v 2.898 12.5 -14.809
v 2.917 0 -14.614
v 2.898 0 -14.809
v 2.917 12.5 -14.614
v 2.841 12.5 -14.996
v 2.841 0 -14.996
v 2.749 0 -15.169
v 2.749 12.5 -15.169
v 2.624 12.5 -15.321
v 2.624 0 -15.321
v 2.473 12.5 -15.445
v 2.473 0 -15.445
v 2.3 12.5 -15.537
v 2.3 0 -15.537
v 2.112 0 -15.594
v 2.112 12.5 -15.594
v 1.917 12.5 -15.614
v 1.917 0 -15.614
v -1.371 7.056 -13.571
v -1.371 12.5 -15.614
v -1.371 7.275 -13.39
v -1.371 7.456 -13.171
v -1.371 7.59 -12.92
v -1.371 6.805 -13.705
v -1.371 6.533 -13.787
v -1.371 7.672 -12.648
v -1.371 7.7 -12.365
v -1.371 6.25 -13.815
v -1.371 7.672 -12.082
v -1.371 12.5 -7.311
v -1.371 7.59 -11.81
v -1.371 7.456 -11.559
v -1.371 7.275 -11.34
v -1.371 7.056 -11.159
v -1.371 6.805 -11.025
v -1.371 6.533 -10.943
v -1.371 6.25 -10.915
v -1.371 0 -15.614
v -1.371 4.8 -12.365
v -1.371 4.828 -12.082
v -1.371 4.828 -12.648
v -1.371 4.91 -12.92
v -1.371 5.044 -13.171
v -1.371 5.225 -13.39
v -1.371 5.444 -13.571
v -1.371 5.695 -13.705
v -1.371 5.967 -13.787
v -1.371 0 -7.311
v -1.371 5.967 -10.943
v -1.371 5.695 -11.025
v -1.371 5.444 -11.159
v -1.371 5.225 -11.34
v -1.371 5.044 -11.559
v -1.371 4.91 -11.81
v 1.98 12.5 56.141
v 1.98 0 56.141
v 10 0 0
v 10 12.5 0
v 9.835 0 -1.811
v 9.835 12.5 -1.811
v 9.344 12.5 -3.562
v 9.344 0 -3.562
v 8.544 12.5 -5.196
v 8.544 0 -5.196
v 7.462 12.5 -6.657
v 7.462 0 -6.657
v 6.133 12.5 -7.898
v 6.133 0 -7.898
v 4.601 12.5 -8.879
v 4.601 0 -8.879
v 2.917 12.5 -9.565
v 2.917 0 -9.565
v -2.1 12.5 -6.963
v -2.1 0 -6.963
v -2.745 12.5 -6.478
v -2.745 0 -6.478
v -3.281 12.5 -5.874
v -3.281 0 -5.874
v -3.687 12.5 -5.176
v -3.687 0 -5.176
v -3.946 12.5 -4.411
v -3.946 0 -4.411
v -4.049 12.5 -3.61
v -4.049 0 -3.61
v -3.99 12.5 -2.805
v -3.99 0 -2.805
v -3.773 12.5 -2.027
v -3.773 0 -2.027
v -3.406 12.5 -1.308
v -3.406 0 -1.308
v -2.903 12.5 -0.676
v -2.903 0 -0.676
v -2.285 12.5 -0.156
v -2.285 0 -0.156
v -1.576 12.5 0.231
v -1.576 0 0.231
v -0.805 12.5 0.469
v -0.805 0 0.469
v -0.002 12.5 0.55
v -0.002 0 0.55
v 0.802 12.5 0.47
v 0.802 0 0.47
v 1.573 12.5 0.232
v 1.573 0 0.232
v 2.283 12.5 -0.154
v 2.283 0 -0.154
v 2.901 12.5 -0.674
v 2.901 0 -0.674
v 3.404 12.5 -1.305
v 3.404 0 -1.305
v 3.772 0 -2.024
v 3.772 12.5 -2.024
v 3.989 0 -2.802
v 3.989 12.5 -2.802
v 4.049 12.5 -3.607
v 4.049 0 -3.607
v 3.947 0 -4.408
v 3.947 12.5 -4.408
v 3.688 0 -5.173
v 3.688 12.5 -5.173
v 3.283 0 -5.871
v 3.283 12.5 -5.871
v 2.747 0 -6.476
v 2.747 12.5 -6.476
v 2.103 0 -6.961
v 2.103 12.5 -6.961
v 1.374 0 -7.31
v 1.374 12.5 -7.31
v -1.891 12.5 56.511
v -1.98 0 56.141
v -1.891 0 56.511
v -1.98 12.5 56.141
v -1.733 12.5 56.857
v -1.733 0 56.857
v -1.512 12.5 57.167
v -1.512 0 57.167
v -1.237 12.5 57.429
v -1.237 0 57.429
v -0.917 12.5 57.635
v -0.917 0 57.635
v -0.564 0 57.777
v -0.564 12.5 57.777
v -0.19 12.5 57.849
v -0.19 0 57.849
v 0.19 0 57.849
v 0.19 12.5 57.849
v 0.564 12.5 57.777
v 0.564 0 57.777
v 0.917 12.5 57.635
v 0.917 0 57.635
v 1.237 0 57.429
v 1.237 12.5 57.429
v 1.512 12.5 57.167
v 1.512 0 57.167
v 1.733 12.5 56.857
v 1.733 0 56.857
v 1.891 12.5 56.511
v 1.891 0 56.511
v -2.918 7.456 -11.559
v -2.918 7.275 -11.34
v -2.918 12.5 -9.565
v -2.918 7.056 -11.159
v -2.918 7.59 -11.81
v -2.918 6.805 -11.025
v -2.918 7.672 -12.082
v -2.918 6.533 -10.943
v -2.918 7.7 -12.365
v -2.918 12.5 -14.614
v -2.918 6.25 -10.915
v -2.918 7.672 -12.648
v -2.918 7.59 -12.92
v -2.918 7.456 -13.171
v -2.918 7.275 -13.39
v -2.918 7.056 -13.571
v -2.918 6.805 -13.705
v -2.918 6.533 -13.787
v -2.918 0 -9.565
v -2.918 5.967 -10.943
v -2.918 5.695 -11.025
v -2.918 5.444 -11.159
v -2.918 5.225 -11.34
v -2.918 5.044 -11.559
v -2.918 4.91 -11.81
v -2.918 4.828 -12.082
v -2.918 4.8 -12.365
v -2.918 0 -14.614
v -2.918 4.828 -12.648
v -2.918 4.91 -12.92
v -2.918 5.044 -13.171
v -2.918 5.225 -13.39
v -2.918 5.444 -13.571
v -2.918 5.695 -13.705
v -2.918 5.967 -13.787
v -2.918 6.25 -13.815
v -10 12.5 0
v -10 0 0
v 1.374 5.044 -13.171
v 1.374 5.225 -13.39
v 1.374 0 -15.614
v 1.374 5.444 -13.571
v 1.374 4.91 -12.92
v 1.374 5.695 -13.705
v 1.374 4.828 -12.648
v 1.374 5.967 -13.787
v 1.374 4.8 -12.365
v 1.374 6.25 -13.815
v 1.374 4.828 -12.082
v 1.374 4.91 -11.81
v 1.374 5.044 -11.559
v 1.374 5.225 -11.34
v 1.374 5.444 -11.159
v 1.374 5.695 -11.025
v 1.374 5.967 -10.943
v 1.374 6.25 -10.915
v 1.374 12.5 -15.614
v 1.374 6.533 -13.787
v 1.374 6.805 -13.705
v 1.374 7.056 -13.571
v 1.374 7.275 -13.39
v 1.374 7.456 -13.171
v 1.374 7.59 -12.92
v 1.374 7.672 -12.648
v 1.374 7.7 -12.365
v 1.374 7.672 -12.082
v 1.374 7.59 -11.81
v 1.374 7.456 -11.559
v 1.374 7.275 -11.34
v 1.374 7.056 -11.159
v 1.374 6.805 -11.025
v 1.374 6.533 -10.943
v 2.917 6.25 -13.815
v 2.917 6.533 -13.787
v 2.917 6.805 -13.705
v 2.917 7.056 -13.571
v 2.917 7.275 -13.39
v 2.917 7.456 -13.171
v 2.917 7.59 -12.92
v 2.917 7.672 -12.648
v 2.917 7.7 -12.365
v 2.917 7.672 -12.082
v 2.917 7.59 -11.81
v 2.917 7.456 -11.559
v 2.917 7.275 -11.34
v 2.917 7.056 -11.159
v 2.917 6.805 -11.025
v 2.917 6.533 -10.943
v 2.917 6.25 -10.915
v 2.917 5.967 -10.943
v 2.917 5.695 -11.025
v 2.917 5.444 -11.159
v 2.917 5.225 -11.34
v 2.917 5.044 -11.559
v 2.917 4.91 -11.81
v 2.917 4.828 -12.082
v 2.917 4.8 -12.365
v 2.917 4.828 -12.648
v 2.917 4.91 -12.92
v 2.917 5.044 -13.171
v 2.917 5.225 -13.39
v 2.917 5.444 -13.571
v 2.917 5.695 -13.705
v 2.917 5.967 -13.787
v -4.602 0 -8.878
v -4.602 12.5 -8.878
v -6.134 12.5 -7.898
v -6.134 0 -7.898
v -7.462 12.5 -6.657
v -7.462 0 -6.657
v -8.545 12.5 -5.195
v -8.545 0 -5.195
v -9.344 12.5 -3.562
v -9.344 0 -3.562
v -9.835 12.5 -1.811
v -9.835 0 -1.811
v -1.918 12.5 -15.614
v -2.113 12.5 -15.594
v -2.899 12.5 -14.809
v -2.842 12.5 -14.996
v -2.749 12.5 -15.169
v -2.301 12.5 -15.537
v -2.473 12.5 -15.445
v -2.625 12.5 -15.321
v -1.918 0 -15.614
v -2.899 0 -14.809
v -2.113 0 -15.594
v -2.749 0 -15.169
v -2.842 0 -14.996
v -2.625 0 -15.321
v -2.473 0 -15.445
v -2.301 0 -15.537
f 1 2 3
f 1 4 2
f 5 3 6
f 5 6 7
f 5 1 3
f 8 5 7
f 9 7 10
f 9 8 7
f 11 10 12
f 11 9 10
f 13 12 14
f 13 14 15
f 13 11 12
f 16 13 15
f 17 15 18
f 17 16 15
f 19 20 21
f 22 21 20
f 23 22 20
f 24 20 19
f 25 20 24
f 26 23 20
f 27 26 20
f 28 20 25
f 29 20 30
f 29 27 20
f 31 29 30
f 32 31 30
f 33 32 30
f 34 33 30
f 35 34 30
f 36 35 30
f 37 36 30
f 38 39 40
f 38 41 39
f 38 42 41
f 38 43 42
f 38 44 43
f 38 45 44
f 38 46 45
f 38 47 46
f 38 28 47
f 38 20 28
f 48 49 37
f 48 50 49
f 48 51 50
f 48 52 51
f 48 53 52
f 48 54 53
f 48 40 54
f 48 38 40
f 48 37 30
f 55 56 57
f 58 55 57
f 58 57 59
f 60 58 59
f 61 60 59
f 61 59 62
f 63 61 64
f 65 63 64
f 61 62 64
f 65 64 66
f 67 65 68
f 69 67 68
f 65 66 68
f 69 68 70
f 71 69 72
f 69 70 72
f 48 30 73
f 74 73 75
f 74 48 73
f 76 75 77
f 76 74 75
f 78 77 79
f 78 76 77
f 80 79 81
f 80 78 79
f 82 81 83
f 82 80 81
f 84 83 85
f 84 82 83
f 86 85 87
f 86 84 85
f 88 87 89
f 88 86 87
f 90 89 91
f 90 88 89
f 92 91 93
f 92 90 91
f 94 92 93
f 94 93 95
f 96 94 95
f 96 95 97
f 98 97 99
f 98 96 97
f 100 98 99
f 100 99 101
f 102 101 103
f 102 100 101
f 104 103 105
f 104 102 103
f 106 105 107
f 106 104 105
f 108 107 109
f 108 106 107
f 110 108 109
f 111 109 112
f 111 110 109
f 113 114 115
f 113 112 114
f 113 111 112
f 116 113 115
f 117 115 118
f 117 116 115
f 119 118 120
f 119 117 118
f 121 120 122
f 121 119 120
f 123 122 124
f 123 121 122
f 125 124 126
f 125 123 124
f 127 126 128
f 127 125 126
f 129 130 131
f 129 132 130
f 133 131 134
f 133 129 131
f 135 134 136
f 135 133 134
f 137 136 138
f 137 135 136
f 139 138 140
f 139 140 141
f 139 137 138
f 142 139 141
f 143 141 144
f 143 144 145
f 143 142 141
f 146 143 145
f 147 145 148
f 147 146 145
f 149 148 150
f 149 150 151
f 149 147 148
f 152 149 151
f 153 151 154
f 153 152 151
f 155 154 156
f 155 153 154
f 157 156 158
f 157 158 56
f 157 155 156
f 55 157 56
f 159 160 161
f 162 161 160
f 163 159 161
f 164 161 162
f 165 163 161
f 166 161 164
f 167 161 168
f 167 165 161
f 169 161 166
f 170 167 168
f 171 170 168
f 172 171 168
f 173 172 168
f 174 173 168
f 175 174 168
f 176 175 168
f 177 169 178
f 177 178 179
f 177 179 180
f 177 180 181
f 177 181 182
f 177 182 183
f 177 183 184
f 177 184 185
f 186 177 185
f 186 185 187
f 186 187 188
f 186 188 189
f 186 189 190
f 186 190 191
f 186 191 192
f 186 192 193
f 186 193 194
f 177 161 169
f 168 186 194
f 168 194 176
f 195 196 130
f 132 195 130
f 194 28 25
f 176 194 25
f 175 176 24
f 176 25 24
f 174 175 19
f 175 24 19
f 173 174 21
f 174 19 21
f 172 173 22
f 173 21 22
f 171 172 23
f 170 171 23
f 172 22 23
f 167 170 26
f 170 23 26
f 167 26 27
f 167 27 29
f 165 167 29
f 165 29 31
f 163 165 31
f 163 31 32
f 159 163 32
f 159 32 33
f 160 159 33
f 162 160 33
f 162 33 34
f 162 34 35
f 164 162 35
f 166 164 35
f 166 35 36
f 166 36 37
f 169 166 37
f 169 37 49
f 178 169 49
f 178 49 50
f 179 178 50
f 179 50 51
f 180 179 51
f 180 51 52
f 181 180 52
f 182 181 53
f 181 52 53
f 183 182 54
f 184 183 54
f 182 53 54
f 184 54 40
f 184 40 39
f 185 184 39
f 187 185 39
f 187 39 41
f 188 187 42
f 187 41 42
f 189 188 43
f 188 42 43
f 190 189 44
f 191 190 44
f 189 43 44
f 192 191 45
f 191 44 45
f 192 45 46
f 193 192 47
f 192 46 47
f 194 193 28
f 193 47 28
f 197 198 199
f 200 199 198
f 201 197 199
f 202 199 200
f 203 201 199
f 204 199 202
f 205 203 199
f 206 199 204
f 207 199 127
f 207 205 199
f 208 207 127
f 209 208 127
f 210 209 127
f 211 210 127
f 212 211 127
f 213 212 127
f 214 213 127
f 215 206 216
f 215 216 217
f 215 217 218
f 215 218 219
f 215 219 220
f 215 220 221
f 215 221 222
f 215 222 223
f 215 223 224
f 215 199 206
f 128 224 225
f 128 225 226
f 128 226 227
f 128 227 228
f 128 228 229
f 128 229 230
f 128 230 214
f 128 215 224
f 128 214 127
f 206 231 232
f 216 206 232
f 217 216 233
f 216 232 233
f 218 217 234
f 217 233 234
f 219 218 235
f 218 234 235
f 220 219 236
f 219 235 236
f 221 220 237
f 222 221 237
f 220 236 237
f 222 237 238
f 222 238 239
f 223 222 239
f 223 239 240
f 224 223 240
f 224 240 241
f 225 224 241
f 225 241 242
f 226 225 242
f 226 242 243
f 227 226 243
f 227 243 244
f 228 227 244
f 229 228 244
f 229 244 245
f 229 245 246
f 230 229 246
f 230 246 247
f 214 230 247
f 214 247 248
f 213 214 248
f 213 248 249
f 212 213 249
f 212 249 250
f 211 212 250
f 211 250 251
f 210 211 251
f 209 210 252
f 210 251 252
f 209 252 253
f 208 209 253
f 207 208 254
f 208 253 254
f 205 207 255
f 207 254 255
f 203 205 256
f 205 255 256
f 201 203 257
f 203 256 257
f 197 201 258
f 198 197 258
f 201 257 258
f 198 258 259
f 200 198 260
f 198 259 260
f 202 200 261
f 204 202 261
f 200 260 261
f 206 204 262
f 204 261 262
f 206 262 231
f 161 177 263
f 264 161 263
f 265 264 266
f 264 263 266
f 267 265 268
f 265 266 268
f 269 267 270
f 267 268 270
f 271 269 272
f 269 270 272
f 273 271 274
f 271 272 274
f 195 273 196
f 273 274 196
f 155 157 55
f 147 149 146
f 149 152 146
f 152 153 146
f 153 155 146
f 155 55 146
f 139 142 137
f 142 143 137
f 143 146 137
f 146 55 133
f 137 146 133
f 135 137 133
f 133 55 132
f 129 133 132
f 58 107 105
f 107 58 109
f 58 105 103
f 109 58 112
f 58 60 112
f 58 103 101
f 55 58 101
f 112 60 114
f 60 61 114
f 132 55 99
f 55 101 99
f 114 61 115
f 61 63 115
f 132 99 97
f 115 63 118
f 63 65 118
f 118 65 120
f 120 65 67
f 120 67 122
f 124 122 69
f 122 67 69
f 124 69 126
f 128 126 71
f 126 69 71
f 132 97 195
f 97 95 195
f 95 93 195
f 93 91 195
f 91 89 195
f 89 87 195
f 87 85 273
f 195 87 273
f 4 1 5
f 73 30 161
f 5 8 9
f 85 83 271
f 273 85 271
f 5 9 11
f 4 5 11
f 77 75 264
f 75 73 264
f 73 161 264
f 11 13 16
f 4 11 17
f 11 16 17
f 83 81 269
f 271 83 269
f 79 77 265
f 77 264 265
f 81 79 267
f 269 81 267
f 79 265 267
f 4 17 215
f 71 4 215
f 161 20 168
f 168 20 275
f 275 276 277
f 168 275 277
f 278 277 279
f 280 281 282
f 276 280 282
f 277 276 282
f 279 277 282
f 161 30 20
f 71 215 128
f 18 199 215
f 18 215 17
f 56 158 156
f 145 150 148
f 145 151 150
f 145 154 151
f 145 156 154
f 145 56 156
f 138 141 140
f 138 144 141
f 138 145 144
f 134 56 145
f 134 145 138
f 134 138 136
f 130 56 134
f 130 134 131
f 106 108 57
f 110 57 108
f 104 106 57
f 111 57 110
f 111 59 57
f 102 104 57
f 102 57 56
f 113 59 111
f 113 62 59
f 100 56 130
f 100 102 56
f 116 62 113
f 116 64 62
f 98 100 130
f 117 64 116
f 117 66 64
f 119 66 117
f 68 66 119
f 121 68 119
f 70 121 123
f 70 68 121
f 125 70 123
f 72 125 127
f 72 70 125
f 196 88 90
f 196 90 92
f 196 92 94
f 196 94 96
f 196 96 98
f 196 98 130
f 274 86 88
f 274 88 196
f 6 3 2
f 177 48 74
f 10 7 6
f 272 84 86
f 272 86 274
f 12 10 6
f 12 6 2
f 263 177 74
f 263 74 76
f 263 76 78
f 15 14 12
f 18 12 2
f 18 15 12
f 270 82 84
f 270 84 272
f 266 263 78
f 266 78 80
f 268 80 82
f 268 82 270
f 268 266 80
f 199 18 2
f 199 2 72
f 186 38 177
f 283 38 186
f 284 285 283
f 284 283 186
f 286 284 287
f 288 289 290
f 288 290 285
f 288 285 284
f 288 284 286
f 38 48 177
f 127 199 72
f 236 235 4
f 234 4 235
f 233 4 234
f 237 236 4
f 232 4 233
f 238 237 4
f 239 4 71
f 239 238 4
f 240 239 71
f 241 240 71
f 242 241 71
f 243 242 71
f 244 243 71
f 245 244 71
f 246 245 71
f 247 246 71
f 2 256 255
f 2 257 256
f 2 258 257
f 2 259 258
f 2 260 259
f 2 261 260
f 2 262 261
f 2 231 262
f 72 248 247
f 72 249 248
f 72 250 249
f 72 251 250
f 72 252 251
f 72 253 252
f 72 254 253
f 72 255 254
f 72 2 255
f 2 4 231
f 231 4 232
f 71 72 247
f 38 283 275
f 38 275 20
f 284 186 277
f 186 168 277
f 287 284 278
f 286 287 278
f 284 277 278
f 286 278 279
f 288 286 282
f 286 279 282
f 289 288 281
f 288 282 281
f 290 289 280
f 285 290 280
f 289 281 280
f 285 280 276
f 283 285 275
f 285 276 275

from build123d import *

# Parameters (mm, degrees)
SKETCH2_R           = 4.05
BOSS_EXTRUDE1_DEPTH = 12.5
FILLET1_R           = 2
CUT_EXTRUDE1_DEPTH  = 61.03151231
BOSS_EXTRUDE2_START = -12.5
BOSS_EXTRUDE2_DEPTH = 12.5
FILLET2_R           = 1
SKETCH7_R           = 1.45
CUT_EXTRUDE2_DEPTH  = 61.585751092


with BuildPart() as part:
    # Sketch2 → Boss-Extrude1 (new body)
    with BuildSketch(Plane(origin=(0, 0, 0), x_dir=(1, 0, 0), z_dir=(0, 1, 0))):
        with BuildLine():
            Line((-10, 0), (0, -70))
            Line((0, -70), (10, 0))
            ThreePointArc((10, 0), (0, 10), (-10, 0))
        make_face()
        with Locations(Location((0, 3.5, 0), (0, 0, 270))):
            Circle(SKETCH2_R, mode=Mode.SUBTRACT)
    extrude(amount=BOSS_EXTRUDE1_DEPTH)

    # Fillet1
    fillet1_edges = [part.edges().sort_by_distance(p)[0] for p in [
        (0, 6.25, 70),
    ]]
    fillet(fillet1_edges, radius=FILLET1_R)

    # Sketch5 → Cut-Extrude1 (cut, through all)
    with BuildSketch(Plane(origin=(0, 12.5, 0), x_dir=(1, 0, 0), z_dir=(0, 1, 0))):
        with BuildLine():
            Line((-1.371121558, 3.757662262), (-1.371121558, 13.050926013))
            Line((-1.371121558, 13.050926013), (1.374099614, 13.050926013))
            Line((1.374099614, 13.050926013), (1.374099614, 3.756574271))
            ThreePointArc((1.374099614, 3.756574271), (0.697747417, 3.938673449), (0, 4))
            ThreePointArc((0, 4), (-0.69618638, 3.938949673), (-1.371121558, 3.757662262))
        make_face()
    extrude(amount=-CUT_EXTRUDE1_DEPTH, mode=Mode.SUBTRACT)

    # Sketch6 → Boss-Extrude2 (add)
    with BuildSketch(Plane(origin=(0, 12.5, 0), x_dir=(1, 0, 0), z_dir=(0, 1, 0)).offset(BOSS_EXTRUDE2_START)):
        with BuildLine():
            Line((-2.91788587, 9.564828386), (-2.91788587, 15.613591417))
            Line((-2.91788587, 15.613591417), (-1.371121558, 15.613591417))
            Line((-1.371121558, 15.613591417), (-1.371121558, 9.905555294))
            ThreePointArc((-1.371121558, 9.905555294), (-2.151260069, 9.765862999), (-2.91788587, 9.564828386))
        make_face()
        with BuildLine():
            Line((1.374099614, 9.905142616), (1.374099614, 15.613591417))
            Line((1.374099614, 15.613591417), (2.917072625, 15.613591417))
            Line((2.917072625, 15.613591417), (2.917072625, 9.56507644))
            ThreePointArc((2.917072625, 9.56507644), (2.152312953, 9.765631006), (1.374099614, 9.905142616))
        make_face()
    extrude(amount=BOSS_EXTRUDE2_DEPTH)

    # Fillet2
    fillet2_edges = [part.edges().sort_by_distance(p)[0] for p in [
        (-2.91788587, 6.25, -15.613591417),
        (2.917072625, 6.25, -15.613591417),
    ]]
    fillet(fillet2_edges, radius=FILLET2_R)

    # Sketch7 → Cut-Extrude2 (cut, through all)
    with BuildSketch(Plane(origin=(2.917072625, 0, 0), x_dir=(0, 0, -1), z_dir=(1, 0, 0))):
        with Locations((12.36507644, 6.25)):
            Circle(SKETCH7_R)
    extrude(amount=-CUT_EXTRUDE2_DEPTH, mode=Mode.SUBTRACT)


solid = part.part
